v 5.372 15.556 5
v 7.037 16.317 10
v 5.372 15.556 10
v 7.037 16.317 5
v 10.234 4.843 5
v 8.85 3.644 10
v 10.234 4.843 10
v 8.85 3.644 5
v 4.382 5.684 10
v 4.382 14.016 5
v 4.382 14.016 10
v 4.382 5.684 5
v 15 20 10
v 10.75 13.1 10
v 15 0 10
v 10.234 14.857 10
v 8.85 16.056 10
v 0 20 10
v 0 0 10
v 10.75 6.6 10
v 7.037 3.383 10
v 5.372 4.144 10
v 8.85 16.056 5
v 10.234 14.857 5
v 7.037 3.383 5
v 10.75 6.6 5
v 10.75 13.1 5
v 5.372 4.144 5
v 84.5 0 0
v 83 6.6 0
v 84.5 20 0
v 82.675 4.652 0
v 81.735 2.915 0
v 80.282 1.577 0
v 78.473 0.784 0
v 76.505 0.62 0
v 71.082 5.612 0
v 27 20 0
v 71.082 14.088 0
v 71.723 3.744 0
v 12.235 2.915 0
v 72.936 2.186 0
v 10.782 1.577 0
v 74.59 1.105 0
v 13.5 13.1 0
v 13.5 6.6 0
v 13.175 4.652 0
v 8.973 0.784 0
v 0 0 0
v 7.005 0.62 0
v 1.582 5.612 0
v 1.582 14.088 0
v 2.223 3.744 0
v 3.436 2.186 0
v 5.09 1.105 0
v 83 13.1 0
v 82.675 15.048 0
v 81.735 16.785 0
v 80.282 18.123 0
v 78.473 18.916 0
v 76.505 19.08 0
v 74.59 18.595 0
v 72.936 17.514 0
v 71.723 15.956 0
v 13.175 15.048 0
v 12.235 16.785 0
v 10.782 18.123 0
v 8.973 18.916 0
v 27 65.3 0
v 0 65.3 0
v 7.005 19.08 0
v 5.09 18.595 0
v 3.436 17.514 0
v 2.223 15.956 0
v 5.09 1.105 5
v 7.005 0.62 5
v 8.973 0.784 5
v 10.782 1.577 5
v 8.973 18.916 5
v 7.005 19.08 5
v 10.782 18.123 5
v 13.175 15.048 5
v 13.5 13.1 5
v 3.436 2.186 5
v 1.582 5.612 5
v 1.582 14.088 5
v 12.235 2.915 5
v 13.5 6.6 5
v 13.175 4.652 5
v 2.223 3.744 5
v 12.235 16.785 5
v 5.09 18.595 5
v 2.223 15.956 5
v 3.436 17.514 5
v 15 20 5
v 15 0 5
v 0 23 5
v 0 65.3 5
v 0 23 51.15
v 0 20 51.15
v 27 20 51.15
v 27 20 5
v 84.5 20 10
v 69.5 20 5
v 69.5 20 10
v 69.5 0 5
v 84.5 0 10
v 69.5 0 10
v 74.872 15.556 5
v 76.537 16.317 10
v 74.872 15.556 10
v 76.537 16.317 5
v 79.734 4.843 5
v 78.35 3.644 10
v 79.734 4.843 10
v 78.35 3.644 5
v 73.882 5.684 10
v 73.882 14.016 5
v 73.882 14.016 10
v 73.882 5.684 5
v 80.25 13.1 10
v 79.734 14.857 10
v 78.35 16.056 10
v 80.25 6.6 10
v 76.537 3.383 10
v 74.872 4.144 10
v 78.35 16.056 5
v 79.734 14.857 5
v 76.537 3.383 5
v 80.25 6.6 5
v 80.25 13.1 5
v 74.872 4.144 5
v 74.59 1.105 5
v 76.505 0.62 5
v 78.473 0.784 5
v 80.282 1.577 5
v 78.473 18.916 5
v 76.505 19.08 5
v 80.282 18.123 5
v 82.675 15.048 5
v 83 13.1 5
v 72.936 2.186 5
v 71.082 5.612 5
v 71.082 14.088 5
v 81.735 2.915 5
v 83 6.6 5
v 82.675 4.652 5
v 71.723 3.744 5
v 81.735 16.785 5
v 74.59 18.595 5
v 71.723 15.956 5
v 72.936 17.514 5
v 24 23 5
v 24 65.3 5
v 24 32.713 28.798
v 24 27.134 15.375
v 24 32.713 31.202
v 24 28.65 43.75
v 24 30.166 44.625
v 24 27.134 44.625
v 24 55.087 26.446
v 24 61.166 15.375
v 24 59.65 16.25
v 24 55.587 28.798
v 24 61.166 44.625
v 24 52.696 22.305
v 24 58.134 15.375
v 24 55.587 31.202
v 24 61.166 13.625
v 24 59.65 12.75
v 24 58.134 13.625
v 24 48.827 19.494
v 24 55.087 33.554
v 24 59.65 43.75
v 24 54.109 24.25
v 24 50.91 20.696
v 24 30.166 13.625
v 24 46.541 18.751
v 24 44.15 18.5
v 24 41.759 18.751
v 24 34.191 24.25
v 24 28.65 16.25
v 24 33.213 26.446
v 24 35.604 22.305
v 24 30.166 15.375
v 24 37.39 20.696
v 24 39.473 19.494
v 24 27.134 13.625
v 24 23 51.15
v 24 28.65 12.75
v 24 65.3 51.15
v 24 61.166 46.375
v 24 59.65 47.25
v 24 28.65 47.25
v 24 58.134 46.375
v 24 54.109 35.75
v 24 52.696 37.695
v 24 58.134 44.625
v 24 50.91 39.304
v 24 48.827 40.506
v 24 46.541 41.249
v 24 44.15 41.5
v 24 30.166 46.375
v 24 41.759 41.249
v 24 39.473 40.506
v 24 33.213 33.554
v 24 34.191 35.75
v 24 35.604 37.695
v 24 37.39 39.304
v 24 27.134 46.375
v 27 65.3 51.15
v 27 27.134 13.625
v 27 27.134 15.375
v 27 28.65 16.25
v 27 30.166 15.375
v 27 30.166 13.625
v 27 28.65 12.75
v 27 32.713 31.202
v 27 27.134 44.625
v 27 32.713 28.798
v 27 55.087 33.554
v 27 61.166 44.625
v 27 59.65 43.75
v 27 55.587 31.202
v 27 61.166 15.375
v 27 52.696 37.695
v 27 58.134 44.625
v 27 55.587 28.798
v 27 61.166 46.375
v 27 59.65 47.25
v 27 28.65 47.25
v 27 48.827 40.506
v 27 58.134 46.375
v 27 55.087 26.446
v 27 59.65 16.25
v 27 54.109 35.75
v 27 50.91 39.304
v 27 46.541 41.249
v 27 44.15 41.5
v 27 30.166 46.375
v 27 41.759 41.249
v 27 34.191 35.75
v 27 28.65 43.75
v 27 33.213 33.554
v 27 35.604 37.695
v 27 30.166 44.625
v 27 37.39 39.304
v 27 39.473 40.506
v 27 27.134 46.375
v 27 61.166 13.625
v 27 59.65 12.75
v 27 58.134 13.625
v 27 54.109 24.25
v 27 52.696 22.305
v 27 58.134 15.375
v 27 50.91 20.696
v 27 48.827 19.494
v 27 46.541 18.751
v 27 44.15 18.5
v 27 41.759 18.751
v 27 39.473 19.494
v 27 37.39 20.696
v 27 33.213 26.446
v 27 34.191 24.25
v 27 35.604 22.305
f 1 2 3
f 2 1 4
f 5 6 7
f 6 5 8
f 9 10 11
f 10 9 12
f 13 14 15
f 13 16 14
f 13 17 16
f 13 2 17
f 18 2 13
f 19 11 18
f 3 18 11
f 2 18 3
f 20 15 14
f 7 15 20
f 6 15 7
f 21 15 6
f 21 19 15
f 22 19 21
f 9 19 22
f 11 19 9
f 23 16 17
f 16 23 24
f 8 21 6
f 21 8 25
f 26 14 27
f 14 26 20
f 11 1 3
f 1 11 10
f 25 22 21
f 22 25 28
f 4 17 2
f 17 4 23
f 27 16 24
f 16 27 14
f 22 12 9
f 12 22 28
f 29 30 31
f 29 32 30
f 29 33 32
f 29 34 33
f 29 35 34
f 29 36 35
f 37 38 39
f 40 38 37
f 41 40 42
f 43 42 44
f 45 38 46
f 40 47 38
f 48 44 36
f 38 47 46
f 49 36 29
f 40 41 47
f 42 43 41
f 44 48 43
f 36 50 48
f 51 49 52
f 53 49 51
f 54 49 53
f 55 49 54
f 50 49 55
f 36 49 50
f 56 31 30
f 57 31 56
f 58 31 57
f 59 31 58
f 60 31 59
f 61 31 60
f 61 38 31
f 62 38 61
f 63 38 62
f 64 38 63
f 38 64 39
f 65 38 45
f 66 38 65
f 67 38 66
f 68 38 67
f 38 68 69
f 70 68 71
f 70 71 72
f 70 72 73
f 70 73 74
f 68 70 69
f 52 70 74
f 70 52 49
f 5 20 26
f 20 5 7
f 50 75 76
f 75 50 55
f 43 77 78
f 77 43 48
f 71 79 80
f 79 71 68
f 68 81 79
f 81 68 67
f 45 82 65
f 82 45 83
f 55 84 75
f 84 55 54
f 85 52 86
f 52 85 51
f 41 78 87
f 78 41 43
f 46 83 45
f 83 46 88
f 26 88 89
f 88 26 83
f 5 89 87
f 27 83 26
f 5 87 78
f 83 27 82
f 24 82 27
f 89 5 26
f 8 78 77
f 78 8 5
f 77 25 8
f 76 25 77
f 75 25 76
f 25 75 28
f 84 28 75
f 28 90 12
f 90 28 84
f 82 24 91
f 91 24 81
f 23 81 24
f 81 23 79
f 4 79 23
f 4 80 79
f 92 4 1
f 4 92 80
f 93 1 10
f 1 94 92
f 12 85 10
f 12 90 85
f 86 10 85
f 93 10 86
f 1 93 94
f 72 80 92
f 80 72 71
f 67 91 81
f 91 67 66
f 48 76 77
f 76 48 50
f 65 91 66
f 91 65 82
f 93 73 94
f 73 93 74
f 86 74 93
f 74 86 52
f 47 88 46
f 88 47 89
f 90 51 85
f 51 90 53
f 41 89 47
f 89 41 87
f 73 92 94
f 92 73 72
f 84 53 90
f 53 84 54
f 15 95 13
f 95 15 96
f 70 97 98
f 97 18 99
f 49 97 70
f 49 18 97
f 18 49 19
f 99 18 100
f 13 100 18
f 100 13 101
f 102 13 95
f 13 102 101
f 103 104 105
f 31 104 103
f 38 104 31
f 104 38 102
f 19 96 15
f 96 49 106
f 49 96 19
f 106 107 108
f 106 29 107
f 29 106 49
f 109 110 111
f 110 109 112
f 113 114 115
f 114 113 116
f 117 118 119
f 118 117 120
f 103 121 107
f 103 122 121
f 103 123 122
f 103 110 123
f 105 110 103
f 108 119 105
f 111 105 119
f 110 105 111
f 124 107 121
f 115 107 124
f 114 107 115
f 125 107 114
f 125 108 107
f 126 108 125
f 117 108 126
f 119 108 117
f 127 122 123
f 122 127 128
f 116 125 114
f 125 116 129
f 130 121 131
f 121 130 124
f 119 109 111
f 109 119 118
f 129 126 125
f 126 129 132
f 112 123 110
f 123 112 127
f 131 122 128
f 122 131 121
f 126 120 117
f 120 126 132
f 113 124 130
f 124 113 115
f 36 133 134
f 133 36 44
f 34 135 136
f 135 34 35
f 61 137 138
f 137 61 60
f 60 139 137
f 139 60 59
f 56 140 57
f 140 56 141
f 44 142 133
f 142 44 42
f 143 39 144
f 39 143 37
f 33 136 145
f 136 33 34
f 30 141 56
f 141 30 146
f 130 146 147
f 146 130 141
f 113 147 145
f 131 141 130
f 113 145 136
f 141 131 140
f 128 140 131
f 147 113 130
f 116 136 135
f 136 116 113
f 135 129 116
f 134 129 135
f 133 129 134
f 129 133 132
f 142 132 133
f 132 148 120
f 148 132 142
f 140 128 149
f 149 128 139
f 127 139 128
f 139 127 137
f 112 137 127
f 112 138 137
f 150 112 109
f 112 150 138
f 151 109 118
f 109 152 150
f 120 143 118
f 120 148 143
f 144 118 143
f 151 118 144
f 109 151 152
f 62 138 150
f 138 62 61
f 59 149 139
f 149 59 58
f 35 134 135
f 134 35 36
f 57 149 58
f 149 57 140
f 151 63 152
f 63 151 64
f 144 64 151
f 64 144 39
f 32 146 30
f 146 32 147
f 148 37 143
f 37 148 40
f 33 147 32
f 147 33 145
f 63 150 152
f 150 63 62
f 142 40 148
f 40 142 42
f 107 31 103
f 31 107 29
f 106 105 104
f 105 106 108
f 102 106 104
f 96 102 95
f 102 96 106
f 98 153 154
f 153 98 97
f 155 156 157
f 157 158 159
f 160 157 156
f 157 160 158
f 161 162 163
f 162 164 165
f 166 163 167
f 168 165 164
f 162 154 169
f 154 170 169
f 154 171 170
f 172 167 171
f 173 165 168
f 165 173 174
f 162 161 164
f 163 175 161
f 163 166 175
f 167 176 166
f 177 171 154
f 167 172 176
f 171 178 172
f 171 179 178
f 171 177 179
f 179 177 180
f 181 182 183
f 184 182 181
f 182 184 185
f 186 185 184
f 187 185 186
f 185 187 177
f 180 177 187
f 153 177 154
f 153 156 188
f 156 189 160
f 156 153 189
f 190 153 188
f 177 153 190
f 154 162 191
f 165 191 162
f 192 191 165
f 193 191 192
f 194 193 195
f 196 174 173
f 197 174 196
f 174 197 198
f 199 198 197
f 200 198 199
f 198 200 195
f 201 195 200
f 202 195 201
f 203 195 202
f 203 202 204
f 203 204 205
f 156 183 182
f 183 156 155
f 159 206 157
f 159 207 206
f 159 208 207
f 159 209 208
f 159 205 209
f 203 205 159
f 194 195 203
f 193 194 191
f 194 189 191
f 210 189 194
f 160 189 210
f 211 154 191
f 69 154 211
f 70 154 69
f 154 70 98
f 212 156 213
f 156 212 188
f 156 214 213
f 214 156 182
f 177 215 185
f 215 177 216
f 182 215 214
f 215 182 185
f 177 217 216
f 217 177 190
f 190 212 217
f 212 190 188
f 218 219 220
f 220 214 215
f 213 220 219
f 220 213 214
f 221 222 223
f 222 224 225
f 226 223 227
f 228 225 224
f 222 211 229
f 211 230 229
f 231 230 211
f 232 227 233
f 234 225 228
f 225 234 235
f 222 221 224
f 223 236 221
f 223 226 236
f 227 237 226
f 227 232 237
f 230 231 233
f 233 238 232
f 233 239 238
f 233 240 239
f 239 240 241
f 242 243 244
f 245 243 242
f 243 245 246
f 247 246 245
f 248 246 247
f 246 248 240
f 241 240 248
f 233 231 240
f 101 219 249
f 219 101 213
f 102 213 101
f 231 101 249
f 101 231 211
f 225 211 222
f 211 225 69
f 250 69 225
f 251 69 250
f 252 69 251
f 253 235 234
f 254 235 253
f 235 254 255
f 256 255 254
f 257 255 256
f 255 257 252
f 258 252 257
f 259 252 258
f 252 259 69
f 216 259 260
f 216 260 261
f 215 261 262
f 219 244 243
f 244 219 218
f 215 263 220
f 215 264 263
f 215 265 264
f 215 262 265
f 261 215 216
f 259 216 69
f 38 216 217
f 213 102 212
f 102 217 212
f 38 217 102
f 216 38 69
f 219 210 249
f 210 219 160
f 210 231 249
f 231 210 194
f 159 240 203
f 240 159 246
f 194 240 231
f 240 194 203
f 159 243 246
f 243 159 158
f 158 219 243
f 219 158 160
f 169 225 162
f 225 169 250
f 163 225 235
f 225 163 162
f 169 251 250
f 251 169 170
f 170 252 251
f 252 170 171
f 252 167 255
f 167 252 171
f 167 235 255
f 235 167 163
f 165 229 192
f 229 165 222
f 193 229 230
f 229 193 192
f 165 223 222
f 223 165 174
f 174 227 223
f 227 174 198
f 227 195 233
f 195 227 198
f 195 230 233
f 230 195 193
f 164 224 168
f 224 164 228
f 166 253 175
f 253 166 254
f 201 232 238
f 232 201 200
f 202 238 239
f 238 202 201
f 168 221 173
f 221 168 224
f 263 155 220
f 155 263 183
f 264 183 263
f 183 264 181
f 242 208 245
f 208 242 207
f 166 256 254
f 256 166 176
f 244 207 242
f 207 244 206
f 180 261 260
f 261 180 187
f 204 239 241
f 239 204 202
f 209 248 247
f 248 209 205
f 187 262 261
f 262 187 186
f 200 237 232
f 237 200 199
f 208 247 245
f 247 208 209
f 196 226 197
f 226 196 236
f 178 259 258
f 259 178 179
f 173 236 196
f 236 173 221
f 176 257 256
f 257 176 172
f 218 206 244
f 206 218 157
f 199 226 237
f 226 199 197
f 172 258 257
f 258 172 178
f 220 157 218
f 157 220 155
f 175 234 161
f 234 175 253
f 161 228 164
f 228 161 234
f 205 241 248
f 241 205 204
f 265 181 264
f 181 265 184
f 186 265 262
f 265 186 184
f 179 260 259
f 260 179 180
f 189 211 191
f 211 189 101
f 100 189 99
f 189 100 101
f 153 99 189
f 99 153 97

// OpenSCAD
nema17_hole_d = 3.5;
nema17_hole_distance = 31;
nema17_hole_length = 5;
nema17_xy = 42.3;
nema17_shaft_hole_d = 23;

lm_x = 15;
lm_y = 20;
lm_z = 5;

lm_hole_d = 6.5;
lm_hole_head_d = 12;
lm_hole_distance = 69.5;
lm_indent_width = 55;



fp_y = 3;
motor_offset_x = 27 - fp_y;
// 30mm from the base
motor_offset_z =  30 - (0.5 * nema17_xy);




//lm_total_width = 89.8;
lm_total_width = lm_x + lm_hole_distance;



fp_x = motor_offset_x + fp_y;
fp_z = motor_offset_z + nema17_xy;

lm_base_y = nema17_xy + fp_y;

module lm_hole() {
    hull() {
    cylinder(d=lm_hole_d, h = 2*lm_z);
    translate([0, lm_hole_d, 0]) cylinder(d=lm_hole_d, h = 2*lm_z);
    }
    hull() {
    cylinder(d=lm_hole_head_d, h = lm_z);
    translate([0, lm_hole_d, 0]) cylinder(d=lm_hole_head_d, h = lm_z);
    }
}
module lower_mount_leg() {
    difference() {
    cube([lm_x, lm_y, 2 * lm_z]);
    translate([0.5*lm_x, 0.33*lm_y, 0]) lm_hole();
    }
    
    
}

module lower_mount() {
    lower_mount_leg();
    translate([lm_hole_distance, 0, 0]) lower_mount_leg();
    translate([lm_x, 0, 0]) cube([lm_indent_width, lm_y, lm_z]);
    
    //small support plate for motor only
    translate([0, lm_y, 0]) cube([motor_offset_x, lm_base_y, lm_z]);
    
    //full size support plate (for future work)
    //translate([0, lm_y, 0]) cube([lm_total_width, lm_base_y, lm_z]);
}
module face_plate(x, y, z) {
    cube([x, y, z]);
    
}

module nema17_holes() {
  offset = 0.5 * (nema17_xy - nema17_hole_distance);
  translate([offset, offset, 0]) {
  translate([0, 0, 0]) cylinder(d=nema17_hole_d, h=nema17_hole_length);
  translate([nema17_hole_distance, 0, 0]) cylinder(d=nema17_hole_d, h=nema17_hole_length);
  translate([0, nema17_hole_distance, 0]) cylinder(d=nema17_hole_d, h=nema17_hole_length);
  translate([nema17_hole_distance, nema17_hole_distance, 0]) cylinder(d=nema17_hole_d, h=nema17_hole_length);
  translate([0.5*nema17_hole_distance, 0.5*nema17_hole_distance, 0]) cylinder(d=nema17_shaft_hole_d, h=nema17_hole_length);
  }
}
module nema17_plate(z_offset) {
    edge = nema17_xy;
    thickness = 3;
    difference() {
    cube([thickness, edge, edge + z_offset]);
    translate([thickness, 0, z_offset]) rotate([0, -90, 0]) nema17_holes();
    }
} 
lower_mount(lm_x, lm_y, lm_z);
translate([0, lm_y, 0]) face_plate(fp_x, fp_y, fp_z);
translate([motor_offset_x, lm_y + fp_y, 0]) nema17_plate(motor_offset_z);
